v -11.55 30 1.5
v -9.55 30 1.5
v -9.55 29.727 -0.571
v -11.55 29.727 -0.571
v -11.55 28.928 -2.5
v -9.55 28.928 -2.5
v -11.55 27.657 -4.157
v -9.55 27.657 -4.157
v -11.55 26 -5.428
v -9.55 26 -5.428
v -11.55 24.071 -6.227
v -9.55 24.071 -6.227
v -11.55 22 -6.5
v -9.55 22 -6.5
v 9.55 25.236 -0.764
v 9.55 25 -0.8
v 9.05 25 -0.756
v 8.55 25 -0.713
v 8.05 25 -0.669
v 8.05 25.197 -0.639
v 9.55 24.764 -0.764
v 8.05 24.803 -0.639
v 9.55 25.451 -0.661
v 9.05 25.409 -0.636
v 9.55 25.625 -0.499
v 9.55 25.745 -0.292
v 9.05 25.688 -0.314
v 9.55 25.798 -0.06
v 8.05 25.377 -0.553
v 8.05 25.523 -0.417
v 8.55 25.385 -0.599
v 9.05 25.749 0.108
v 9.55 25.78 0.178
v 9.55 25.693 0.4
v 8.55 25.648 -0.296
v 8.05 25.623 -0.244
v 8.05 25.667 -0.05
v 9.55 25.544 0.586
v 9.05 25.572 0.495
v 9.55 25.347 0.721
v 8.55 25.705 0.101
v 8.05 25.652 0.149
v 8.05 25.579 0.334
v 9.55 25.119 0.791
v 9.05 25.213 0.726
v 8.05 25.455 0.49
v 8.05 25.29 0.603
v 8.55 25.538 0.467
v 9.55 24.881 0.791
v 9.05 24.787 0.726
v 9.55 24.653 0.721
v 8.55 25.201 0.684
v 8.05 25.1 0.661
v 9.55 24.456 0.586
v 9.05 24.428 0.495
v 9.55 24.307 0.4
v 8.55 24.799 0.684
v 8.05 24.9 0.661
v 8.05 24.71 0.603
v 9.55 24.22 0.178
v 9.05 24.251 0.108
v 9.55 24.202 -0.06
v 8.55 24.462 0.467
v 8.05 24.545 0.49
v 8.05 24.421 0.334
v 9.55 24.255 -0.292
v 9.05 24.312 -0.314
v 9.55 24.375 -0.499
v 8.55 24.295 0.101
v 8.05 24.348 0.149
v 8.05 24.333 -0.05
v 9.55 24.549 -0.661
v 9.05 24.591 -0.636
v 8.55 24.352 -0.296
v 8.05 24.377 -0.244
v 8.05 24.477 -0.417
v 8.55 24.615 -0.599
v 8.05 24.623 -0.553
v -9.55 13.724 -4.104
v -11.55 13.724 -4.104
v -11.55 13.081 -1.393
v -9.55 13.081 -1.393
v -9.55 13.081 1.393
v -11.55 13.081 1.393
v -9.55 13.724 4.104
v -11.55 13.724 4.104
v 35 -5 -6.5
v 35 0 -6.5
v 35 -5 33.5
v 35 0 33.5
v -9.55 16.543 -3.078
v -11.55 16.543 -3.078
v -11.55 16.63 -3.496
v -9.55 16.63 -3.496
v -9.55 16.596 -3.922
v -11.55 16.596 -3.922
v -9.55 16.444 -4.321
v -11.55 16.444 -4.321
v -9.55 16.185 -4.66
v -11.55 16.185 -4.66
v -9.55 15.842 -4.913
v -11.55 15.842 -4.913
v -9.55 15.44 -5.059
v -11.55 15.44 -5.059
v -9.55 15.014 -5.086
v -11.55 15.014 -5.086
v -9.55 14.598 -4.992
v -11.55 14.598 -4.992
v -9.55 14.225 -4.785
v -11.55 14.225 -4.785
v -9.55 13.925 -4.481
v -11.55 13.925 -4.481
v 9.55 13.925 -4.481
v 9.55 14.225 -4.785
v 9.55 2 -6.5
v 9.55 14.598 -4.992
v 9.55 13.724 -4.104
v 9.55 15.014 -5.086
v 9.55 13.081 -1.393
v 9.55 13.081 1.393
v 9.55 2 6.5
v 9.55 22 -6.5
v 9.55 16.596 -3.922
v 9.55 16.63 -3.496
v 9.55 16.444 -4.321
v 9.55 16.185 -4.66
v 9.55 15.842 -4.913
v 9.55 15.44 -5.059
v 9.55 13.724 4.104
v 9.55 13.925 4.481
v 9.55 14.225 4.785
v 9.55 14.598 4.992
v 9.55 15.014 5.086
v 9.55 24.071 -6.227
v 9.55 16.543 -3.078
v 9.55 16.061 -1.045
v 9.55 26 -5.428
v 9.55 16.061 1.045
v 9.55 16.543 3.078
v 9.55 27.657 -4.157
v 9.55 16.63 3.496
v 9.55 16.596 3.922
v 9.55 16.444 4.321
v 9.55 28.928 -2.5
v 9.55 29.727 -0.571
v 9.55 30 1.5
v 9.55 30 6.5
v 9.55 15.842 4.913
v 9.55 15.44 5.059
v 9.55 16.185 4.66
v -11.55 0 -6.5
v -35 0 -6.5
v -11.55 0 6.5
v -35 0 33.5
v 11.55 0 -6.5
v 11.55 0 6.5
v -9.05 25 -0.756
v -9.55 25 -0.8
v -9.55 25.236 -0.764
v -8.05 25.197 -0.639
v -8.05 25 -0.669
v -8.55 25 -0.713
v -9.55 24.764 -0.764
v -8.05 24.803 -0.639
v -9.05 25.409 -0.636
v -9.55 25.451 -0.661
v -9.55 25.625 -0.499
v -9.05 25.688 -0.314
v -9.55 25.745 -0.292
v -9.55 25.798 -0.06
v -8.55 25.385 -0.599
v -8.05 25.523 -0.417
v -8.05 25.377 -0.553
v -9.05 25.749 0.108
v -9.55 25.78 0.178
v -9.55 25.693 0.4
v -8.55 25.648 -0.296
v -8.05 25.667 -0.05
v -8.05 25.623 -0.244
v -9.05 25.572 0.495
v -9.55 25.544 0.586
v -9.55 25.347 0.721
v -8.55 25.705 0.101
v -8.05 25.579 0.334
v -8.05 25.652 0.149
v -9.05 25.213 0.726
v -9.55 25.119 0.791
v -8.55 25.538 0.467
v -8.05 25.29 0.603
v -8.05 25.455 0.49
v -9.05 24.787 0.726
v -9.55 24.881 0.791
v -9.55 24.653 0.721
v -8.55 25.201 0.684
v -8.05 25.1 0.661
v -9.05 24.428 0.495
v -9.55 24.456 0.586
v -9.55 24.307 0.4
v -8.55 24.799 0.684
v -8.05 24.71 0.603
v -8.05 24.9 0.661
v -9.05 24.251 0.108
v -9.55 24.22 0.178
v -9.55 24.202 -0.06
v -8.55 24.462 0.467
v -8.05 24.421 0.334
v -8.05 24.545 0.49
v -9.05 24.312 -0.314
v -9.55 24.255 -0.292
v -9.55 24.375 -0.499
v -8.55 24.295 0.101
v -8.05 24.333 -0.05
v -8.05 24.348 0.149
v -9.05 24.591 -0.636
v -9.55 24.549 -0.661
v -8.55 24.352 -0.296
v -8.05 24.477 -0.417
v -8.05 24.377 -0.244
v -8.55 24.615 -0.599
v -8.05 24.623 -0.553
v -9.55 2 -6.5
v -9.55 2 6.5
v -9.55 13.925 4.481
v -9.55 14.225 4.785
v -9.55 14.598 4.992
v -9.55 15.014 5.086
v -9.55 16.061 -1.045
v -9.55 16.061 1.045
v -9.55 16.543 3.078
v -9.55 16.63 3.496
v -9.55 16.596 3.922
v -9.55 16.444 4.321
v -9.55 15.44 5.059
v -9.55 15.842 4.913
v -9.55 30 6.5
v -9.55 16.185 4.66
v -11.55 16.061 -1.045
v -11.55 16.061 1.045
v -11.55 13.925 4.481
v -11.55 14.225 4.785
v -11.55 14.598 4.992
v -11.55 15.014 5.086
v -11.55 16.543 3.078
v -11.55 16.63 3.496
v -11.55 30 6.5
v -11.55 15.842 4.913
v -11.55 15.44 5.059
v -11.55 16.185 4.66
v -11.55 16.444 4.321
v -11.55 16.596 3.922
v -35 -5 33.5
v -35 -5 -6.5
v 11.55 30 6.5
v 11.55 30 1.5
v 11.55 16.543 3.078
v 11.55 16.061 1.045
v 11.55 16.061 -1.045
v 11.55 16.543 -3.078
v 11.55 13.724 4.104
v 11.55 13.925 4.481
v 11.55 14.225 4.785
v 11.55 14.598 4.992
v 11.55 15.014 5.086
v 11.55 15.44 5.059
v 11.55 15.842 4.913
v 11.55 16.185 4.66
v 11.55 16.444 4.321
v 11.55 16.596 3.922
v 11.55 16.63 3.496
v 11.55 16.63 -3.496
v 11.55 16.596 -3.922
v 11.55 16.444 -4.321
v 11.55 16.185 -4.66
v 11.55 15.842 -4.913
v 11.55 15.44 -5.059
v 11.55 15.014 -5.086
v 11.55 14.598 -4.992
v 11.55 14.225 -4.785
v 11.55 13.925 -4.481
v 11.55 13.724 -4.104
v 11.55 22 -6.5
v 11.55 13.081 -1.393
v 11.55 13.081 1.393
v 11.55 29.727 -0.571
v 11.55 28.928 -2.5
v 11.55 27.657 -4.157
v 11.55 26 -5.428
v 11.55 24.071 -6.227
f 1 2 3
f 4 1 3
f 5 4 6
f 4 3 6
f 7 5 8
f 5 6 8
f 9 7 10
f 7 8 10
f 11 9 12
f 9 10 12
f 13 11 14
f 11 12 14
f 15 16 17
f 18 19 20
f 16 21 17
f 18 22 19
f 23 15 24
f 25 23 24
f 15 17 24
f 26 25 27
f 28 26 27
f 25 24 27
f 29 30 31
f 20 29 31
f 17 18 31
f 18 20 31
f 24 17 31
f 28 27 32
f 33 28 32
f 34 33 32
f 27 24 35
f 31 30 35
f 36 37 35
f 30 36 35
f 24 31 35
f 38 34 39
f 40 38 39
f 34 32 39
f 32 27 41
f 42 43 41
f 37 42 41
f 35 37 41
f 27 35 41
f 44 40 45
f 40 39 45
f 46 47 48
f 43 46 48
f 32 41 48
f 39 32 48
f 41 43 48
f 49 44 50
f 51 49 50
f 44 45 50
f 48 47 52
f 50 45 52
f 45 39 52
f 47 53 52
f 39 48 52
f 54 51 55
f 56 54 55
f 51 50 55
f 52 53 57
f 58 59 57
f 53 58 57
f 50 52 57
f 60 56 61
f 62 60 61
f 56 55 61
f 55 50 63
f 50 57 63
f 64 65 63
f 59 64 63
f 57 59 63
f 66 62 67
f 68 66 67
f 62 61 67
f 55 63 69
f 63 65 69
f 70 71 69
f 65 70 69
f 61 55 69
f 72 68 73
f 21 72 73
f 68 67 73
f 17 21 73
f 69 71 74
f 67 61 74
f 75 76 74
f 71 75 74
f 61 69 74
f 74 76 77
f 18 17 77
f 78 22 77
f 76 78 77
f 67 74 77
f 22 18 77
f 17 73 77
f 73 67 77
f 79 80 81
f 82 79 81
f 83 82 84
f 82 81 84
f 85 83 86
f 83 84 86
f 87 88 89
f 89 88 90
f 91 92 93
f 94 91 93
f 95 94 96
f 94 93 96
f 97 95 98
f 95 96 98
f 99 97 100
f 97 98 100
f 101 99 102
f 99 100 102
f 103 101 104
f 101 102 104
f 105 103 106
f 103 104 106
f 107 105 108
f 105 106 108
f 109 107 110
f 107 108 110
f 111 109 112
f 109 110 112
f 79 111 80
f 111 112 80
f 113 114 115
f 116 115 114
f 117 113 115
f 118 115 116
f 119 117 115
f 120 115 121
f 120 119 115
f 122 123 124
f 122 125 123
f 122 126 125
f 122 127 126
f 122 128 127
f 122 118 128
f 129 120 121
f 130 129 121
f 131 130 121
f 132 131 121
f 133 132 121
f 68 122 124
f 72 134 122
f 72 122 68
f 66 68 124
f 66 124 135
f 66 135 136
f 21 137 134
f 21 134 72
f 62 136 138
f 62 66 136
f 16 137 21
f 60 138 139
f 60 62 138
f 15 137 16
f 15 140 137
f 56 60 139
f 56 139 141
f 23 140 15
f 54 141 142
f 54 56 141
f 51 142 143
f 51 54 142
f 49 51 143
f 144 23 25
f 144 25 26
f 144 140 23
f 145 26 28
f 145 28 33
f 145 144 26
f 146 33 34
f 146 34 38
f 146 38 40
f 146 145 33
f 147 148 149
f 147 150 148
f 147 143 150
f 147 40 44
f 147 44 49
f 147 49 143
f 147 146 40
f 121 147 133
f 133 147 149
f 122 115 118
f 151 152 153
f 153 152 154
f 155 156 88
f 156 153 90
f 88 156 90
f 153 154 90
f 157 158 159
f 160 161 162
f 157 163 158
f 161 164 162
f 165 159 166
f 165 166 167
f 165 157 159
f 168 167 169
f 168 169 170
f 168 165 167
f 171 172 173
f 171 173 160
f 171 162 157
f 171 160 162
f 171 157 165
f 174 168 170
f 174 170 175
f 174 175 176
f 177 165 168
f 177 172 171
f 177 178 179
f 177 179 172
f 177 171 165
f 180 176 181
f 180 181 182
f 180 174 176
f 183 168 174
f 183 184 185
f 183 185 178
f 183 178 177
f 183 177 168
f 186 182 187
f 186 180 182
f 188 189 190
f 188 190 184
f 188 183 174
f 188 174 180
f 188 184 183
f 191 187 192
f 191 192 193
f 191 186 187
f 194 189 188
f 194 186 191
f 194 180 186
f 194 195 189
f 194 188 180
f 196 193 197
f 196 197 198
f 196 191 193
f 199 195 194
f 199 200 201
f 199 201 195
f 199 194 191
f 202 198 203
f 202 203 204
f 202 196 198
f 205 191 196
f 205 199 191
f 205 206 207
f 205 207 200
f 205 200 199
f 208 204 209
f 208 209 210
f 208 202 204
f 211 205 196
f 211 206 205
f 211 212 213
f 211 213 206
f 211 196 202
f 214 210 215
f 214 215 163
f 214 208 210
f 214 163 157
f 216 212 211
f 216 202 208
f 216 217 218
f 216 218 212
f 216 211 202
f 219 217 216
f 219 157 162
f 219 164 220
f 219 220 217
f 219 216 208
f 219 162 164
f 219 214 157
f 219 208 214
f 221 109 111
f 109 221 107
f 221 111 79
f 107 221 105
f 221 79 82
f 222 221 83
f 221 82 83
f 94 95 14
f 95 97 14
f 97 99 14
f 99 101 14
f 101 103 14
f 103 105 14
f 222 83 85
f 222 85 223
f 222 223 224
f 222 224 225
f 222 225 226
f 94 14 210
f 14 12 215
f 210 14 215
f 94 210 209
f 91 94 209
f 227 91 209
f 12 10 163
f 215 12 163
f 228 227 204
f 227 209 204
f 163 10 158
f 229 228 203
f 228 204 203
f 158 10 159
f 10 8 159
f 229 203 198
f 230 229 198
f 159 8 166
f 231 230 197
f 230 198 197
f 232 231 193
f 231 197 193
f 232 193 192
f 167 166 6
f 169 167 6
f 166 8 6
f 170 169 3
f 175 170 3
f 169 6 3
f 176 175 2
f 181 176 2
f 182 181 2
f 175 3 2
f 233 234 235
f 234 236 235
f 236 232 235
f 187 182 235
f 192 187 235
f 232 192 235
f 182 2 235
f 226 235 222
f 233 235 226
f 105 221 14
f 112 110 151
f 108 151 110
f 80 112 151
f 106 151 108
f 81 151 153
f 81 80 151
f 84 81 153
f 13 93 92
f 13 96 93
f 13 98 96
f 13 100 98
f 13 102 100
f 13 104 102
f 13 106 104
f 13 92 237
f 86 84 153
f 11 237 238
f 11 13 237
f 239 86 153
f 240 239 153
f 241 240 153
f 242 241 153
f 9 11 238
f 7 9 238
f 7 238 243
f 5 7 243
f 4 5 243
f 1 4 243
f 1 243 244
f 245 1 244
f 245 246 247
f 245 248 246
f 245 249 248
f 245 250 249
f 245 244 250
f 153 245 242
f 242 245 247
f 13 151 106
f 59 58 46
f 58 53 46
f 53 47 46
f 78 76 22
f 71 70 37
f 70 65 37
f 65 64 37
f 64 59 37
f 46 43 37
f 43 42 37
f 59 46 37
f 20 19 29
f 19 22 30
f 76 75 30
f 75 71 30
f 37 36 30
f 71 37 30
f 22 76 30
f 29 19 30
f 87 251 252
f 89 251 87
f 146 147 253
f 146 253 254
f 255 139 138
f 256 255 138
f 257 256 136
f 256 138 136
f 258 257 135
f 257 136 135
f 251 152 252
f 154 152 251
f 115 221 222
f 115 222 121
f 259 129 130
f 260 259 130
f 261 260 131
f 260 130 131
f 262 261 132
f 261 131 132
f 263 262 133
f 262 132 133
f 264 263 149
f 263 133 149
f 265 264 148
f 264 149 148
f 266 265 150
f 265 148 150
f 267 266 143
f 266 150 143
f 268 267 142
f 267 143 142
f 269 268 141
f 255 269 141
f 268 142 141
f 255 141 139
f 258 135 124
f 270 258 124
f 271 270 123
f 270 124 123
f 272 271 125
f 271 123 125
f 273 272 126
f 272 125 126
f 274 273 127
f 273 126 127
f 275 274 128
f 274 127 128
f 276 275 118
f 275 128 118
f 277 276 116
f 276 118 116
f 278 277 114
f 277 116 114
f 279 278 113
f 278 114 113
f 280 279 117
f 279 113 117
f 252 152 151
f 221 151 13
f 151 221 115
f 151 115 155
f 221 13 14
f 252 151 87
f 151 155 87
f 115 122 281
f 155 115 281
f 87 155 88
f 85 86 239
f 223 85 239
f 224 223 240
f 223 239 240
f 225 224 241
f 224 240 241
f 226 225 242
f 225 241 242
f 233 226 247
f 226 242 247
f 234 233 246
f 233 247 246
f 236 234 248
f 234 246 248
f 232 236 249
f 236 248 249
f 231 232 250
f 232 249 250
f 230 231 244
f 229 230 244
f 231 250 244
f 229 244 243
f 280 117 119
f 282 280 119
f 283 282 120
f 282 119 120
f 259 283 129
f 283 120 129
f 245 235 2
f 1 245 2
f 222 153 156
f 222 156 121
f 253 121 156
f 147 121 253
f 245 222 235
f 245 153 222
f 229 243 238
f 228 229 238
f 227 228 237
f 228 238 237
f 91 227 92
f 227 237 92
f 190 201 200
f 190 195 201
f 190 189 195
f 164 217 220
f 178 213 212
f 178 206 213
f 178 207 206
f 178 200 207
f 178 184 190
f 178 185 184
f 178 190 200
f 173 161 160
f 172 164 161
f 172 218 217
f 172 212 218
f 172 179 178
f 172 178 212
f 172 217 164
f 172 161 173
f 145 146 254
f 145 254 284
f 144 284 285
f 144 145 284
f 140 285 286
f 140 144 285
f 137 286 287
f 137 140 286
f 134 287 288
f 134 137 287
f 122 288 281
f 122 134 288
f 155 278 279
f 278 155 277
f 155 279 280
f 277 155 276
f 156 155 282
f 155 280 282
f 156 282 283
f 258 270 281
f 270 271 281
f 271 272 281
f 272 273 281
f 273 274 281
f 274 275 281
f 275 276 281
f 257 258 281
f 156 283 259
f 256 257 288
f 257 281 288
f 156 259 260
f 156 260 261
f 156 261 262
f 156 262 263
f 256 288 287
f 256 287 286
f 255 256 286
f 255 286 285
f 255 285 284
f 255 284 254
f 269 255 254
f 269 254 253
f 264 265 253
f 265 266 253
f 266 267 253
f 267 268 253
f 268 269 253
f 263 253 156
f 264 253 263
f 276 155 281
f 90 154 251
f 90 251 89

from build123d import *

# Parameters (mm, degrees)
SKETCH2_W               = 19.1
SKETCH2_H               = 13
BOSS_EXTRUDE1_DEPTH     = 2
BOSS_EXTRUDE2_DEPTH     = 2
SKETCH4_R               = 0.8
BOSS_EXTRUDE3_DEPTH     = 1.5
BOSS_EXTRUDE3_TAPER     = 5
CUT_EXTRUDE1_DEPTH      = 38.248624136
CUT_EXTRUDE1_DEPTH_BACK = 38.248624136
SKETCH6_W               = 70
SKETCH6_H               = 40
BOSS_EXTRUDE4_DEPTH     = 5


with BuildPart() as part:
    # Sketch2 → Boss-Extrude1 (new body)
    with BuildSketch(Plane(origin=(0, 0, 0), x_dir=(1, 0, 0), z_dir=(0, 1, 0))):
        Rectangle(SKETCH2_W, SKETCH2_H)
    extrude(amount=BOSS_EXTRUDE1_DEPTH)

    # Sketch3 → Boss-Extrude2 (add)
    with BuildSketch(Plane.ZY.offset(9.55)):
        with BuildLine():
            Line((6.5, 0), (6.5, 30))
            Line((6.5, 30), (1.5, 30))
            ThreePointArc((1.5, 30), (-4.156854249, 27.656854249), (-6.5, 22))
            Line((-6.5, 22), (-6.5, 0))
            Line((-6.5, 0), (6.5, 0))
        make_face()
    boss_extrude2 = extrude(amount=BOSS_EXTRUDE2_DEPTH)

    # Sketch4 → Boss-Extrude3 (add)
    with BuildSketch(Plane(origin=(-9.55, 0, 0), x_dir=(0, 0, -1), z_dir=(1, 0, 0))):
        with Locations((0, 25)):
            Circle(SKETCH4_R)
    boss_extrude3 = extrude(amount=BOSS_EXTRUDE3_DEPTH, taper=BOSS_EXTRUDE3_TAPER)

    # Mirror1: Boss-Extrude2, Boss-Extrude3 across plane
    add(boss_extrude2.mirror(Plane(origin=(0, 0, 0), x_dir=(0, 0, 1), z_dir=(1, 0, 0))))
    add(boss_extrude3.mirror(Plane(origin=(0, 0, 0), x_dir=(0, 0, 1), z_dir=(1, 0, 0))))

    # Sketch5 → Cut-Extrude1 (cut, two sides: drawn at the far end of the back side and taken through both)
    with BuildSketch(Plane(origin=(-9.55, 0, 0), x_dir=(0, 0, -1), z_dir=(1, 0, 0)).offset(-CUT_EXTRUDE1_DEPTH_BACK)):
        with BuildLine():
            ThreePointArc((3.07818129, 16.542766413), (5.000750436, 15.646257697), (4.10424172, 13.723688551))
            ThreePointArc((4.10424172, 13.723688551), (0, 13), (-4.10424172, 13.723688551))
            ThreePointArc((-4.10424172, 13.723688551), (-5.000750436, 15.646257697), (-3.07818129, 16.542766413))
            ThreePointArc((-3.07818129, 16.542766413), (0, 16), (3.07818129, 16.542766413))
        make_face()
    extrude(amount=CUT_EXTRUDE1_DEPTH + CUT_EXTRUDE1_DEPTH_BACK, mode=Mode.SUBTRACT)

    # Sketch6 → Boss-Extrude4 (add)
    with BuildSketch(Plane.XZ):
        with Locations((0, 13.5)):
            Rectangle(SKETCH6_W, SKETCH6_H)
    extrude(amount=BOSS_EXTRUDE4_DEPTH)


solid = part.part
